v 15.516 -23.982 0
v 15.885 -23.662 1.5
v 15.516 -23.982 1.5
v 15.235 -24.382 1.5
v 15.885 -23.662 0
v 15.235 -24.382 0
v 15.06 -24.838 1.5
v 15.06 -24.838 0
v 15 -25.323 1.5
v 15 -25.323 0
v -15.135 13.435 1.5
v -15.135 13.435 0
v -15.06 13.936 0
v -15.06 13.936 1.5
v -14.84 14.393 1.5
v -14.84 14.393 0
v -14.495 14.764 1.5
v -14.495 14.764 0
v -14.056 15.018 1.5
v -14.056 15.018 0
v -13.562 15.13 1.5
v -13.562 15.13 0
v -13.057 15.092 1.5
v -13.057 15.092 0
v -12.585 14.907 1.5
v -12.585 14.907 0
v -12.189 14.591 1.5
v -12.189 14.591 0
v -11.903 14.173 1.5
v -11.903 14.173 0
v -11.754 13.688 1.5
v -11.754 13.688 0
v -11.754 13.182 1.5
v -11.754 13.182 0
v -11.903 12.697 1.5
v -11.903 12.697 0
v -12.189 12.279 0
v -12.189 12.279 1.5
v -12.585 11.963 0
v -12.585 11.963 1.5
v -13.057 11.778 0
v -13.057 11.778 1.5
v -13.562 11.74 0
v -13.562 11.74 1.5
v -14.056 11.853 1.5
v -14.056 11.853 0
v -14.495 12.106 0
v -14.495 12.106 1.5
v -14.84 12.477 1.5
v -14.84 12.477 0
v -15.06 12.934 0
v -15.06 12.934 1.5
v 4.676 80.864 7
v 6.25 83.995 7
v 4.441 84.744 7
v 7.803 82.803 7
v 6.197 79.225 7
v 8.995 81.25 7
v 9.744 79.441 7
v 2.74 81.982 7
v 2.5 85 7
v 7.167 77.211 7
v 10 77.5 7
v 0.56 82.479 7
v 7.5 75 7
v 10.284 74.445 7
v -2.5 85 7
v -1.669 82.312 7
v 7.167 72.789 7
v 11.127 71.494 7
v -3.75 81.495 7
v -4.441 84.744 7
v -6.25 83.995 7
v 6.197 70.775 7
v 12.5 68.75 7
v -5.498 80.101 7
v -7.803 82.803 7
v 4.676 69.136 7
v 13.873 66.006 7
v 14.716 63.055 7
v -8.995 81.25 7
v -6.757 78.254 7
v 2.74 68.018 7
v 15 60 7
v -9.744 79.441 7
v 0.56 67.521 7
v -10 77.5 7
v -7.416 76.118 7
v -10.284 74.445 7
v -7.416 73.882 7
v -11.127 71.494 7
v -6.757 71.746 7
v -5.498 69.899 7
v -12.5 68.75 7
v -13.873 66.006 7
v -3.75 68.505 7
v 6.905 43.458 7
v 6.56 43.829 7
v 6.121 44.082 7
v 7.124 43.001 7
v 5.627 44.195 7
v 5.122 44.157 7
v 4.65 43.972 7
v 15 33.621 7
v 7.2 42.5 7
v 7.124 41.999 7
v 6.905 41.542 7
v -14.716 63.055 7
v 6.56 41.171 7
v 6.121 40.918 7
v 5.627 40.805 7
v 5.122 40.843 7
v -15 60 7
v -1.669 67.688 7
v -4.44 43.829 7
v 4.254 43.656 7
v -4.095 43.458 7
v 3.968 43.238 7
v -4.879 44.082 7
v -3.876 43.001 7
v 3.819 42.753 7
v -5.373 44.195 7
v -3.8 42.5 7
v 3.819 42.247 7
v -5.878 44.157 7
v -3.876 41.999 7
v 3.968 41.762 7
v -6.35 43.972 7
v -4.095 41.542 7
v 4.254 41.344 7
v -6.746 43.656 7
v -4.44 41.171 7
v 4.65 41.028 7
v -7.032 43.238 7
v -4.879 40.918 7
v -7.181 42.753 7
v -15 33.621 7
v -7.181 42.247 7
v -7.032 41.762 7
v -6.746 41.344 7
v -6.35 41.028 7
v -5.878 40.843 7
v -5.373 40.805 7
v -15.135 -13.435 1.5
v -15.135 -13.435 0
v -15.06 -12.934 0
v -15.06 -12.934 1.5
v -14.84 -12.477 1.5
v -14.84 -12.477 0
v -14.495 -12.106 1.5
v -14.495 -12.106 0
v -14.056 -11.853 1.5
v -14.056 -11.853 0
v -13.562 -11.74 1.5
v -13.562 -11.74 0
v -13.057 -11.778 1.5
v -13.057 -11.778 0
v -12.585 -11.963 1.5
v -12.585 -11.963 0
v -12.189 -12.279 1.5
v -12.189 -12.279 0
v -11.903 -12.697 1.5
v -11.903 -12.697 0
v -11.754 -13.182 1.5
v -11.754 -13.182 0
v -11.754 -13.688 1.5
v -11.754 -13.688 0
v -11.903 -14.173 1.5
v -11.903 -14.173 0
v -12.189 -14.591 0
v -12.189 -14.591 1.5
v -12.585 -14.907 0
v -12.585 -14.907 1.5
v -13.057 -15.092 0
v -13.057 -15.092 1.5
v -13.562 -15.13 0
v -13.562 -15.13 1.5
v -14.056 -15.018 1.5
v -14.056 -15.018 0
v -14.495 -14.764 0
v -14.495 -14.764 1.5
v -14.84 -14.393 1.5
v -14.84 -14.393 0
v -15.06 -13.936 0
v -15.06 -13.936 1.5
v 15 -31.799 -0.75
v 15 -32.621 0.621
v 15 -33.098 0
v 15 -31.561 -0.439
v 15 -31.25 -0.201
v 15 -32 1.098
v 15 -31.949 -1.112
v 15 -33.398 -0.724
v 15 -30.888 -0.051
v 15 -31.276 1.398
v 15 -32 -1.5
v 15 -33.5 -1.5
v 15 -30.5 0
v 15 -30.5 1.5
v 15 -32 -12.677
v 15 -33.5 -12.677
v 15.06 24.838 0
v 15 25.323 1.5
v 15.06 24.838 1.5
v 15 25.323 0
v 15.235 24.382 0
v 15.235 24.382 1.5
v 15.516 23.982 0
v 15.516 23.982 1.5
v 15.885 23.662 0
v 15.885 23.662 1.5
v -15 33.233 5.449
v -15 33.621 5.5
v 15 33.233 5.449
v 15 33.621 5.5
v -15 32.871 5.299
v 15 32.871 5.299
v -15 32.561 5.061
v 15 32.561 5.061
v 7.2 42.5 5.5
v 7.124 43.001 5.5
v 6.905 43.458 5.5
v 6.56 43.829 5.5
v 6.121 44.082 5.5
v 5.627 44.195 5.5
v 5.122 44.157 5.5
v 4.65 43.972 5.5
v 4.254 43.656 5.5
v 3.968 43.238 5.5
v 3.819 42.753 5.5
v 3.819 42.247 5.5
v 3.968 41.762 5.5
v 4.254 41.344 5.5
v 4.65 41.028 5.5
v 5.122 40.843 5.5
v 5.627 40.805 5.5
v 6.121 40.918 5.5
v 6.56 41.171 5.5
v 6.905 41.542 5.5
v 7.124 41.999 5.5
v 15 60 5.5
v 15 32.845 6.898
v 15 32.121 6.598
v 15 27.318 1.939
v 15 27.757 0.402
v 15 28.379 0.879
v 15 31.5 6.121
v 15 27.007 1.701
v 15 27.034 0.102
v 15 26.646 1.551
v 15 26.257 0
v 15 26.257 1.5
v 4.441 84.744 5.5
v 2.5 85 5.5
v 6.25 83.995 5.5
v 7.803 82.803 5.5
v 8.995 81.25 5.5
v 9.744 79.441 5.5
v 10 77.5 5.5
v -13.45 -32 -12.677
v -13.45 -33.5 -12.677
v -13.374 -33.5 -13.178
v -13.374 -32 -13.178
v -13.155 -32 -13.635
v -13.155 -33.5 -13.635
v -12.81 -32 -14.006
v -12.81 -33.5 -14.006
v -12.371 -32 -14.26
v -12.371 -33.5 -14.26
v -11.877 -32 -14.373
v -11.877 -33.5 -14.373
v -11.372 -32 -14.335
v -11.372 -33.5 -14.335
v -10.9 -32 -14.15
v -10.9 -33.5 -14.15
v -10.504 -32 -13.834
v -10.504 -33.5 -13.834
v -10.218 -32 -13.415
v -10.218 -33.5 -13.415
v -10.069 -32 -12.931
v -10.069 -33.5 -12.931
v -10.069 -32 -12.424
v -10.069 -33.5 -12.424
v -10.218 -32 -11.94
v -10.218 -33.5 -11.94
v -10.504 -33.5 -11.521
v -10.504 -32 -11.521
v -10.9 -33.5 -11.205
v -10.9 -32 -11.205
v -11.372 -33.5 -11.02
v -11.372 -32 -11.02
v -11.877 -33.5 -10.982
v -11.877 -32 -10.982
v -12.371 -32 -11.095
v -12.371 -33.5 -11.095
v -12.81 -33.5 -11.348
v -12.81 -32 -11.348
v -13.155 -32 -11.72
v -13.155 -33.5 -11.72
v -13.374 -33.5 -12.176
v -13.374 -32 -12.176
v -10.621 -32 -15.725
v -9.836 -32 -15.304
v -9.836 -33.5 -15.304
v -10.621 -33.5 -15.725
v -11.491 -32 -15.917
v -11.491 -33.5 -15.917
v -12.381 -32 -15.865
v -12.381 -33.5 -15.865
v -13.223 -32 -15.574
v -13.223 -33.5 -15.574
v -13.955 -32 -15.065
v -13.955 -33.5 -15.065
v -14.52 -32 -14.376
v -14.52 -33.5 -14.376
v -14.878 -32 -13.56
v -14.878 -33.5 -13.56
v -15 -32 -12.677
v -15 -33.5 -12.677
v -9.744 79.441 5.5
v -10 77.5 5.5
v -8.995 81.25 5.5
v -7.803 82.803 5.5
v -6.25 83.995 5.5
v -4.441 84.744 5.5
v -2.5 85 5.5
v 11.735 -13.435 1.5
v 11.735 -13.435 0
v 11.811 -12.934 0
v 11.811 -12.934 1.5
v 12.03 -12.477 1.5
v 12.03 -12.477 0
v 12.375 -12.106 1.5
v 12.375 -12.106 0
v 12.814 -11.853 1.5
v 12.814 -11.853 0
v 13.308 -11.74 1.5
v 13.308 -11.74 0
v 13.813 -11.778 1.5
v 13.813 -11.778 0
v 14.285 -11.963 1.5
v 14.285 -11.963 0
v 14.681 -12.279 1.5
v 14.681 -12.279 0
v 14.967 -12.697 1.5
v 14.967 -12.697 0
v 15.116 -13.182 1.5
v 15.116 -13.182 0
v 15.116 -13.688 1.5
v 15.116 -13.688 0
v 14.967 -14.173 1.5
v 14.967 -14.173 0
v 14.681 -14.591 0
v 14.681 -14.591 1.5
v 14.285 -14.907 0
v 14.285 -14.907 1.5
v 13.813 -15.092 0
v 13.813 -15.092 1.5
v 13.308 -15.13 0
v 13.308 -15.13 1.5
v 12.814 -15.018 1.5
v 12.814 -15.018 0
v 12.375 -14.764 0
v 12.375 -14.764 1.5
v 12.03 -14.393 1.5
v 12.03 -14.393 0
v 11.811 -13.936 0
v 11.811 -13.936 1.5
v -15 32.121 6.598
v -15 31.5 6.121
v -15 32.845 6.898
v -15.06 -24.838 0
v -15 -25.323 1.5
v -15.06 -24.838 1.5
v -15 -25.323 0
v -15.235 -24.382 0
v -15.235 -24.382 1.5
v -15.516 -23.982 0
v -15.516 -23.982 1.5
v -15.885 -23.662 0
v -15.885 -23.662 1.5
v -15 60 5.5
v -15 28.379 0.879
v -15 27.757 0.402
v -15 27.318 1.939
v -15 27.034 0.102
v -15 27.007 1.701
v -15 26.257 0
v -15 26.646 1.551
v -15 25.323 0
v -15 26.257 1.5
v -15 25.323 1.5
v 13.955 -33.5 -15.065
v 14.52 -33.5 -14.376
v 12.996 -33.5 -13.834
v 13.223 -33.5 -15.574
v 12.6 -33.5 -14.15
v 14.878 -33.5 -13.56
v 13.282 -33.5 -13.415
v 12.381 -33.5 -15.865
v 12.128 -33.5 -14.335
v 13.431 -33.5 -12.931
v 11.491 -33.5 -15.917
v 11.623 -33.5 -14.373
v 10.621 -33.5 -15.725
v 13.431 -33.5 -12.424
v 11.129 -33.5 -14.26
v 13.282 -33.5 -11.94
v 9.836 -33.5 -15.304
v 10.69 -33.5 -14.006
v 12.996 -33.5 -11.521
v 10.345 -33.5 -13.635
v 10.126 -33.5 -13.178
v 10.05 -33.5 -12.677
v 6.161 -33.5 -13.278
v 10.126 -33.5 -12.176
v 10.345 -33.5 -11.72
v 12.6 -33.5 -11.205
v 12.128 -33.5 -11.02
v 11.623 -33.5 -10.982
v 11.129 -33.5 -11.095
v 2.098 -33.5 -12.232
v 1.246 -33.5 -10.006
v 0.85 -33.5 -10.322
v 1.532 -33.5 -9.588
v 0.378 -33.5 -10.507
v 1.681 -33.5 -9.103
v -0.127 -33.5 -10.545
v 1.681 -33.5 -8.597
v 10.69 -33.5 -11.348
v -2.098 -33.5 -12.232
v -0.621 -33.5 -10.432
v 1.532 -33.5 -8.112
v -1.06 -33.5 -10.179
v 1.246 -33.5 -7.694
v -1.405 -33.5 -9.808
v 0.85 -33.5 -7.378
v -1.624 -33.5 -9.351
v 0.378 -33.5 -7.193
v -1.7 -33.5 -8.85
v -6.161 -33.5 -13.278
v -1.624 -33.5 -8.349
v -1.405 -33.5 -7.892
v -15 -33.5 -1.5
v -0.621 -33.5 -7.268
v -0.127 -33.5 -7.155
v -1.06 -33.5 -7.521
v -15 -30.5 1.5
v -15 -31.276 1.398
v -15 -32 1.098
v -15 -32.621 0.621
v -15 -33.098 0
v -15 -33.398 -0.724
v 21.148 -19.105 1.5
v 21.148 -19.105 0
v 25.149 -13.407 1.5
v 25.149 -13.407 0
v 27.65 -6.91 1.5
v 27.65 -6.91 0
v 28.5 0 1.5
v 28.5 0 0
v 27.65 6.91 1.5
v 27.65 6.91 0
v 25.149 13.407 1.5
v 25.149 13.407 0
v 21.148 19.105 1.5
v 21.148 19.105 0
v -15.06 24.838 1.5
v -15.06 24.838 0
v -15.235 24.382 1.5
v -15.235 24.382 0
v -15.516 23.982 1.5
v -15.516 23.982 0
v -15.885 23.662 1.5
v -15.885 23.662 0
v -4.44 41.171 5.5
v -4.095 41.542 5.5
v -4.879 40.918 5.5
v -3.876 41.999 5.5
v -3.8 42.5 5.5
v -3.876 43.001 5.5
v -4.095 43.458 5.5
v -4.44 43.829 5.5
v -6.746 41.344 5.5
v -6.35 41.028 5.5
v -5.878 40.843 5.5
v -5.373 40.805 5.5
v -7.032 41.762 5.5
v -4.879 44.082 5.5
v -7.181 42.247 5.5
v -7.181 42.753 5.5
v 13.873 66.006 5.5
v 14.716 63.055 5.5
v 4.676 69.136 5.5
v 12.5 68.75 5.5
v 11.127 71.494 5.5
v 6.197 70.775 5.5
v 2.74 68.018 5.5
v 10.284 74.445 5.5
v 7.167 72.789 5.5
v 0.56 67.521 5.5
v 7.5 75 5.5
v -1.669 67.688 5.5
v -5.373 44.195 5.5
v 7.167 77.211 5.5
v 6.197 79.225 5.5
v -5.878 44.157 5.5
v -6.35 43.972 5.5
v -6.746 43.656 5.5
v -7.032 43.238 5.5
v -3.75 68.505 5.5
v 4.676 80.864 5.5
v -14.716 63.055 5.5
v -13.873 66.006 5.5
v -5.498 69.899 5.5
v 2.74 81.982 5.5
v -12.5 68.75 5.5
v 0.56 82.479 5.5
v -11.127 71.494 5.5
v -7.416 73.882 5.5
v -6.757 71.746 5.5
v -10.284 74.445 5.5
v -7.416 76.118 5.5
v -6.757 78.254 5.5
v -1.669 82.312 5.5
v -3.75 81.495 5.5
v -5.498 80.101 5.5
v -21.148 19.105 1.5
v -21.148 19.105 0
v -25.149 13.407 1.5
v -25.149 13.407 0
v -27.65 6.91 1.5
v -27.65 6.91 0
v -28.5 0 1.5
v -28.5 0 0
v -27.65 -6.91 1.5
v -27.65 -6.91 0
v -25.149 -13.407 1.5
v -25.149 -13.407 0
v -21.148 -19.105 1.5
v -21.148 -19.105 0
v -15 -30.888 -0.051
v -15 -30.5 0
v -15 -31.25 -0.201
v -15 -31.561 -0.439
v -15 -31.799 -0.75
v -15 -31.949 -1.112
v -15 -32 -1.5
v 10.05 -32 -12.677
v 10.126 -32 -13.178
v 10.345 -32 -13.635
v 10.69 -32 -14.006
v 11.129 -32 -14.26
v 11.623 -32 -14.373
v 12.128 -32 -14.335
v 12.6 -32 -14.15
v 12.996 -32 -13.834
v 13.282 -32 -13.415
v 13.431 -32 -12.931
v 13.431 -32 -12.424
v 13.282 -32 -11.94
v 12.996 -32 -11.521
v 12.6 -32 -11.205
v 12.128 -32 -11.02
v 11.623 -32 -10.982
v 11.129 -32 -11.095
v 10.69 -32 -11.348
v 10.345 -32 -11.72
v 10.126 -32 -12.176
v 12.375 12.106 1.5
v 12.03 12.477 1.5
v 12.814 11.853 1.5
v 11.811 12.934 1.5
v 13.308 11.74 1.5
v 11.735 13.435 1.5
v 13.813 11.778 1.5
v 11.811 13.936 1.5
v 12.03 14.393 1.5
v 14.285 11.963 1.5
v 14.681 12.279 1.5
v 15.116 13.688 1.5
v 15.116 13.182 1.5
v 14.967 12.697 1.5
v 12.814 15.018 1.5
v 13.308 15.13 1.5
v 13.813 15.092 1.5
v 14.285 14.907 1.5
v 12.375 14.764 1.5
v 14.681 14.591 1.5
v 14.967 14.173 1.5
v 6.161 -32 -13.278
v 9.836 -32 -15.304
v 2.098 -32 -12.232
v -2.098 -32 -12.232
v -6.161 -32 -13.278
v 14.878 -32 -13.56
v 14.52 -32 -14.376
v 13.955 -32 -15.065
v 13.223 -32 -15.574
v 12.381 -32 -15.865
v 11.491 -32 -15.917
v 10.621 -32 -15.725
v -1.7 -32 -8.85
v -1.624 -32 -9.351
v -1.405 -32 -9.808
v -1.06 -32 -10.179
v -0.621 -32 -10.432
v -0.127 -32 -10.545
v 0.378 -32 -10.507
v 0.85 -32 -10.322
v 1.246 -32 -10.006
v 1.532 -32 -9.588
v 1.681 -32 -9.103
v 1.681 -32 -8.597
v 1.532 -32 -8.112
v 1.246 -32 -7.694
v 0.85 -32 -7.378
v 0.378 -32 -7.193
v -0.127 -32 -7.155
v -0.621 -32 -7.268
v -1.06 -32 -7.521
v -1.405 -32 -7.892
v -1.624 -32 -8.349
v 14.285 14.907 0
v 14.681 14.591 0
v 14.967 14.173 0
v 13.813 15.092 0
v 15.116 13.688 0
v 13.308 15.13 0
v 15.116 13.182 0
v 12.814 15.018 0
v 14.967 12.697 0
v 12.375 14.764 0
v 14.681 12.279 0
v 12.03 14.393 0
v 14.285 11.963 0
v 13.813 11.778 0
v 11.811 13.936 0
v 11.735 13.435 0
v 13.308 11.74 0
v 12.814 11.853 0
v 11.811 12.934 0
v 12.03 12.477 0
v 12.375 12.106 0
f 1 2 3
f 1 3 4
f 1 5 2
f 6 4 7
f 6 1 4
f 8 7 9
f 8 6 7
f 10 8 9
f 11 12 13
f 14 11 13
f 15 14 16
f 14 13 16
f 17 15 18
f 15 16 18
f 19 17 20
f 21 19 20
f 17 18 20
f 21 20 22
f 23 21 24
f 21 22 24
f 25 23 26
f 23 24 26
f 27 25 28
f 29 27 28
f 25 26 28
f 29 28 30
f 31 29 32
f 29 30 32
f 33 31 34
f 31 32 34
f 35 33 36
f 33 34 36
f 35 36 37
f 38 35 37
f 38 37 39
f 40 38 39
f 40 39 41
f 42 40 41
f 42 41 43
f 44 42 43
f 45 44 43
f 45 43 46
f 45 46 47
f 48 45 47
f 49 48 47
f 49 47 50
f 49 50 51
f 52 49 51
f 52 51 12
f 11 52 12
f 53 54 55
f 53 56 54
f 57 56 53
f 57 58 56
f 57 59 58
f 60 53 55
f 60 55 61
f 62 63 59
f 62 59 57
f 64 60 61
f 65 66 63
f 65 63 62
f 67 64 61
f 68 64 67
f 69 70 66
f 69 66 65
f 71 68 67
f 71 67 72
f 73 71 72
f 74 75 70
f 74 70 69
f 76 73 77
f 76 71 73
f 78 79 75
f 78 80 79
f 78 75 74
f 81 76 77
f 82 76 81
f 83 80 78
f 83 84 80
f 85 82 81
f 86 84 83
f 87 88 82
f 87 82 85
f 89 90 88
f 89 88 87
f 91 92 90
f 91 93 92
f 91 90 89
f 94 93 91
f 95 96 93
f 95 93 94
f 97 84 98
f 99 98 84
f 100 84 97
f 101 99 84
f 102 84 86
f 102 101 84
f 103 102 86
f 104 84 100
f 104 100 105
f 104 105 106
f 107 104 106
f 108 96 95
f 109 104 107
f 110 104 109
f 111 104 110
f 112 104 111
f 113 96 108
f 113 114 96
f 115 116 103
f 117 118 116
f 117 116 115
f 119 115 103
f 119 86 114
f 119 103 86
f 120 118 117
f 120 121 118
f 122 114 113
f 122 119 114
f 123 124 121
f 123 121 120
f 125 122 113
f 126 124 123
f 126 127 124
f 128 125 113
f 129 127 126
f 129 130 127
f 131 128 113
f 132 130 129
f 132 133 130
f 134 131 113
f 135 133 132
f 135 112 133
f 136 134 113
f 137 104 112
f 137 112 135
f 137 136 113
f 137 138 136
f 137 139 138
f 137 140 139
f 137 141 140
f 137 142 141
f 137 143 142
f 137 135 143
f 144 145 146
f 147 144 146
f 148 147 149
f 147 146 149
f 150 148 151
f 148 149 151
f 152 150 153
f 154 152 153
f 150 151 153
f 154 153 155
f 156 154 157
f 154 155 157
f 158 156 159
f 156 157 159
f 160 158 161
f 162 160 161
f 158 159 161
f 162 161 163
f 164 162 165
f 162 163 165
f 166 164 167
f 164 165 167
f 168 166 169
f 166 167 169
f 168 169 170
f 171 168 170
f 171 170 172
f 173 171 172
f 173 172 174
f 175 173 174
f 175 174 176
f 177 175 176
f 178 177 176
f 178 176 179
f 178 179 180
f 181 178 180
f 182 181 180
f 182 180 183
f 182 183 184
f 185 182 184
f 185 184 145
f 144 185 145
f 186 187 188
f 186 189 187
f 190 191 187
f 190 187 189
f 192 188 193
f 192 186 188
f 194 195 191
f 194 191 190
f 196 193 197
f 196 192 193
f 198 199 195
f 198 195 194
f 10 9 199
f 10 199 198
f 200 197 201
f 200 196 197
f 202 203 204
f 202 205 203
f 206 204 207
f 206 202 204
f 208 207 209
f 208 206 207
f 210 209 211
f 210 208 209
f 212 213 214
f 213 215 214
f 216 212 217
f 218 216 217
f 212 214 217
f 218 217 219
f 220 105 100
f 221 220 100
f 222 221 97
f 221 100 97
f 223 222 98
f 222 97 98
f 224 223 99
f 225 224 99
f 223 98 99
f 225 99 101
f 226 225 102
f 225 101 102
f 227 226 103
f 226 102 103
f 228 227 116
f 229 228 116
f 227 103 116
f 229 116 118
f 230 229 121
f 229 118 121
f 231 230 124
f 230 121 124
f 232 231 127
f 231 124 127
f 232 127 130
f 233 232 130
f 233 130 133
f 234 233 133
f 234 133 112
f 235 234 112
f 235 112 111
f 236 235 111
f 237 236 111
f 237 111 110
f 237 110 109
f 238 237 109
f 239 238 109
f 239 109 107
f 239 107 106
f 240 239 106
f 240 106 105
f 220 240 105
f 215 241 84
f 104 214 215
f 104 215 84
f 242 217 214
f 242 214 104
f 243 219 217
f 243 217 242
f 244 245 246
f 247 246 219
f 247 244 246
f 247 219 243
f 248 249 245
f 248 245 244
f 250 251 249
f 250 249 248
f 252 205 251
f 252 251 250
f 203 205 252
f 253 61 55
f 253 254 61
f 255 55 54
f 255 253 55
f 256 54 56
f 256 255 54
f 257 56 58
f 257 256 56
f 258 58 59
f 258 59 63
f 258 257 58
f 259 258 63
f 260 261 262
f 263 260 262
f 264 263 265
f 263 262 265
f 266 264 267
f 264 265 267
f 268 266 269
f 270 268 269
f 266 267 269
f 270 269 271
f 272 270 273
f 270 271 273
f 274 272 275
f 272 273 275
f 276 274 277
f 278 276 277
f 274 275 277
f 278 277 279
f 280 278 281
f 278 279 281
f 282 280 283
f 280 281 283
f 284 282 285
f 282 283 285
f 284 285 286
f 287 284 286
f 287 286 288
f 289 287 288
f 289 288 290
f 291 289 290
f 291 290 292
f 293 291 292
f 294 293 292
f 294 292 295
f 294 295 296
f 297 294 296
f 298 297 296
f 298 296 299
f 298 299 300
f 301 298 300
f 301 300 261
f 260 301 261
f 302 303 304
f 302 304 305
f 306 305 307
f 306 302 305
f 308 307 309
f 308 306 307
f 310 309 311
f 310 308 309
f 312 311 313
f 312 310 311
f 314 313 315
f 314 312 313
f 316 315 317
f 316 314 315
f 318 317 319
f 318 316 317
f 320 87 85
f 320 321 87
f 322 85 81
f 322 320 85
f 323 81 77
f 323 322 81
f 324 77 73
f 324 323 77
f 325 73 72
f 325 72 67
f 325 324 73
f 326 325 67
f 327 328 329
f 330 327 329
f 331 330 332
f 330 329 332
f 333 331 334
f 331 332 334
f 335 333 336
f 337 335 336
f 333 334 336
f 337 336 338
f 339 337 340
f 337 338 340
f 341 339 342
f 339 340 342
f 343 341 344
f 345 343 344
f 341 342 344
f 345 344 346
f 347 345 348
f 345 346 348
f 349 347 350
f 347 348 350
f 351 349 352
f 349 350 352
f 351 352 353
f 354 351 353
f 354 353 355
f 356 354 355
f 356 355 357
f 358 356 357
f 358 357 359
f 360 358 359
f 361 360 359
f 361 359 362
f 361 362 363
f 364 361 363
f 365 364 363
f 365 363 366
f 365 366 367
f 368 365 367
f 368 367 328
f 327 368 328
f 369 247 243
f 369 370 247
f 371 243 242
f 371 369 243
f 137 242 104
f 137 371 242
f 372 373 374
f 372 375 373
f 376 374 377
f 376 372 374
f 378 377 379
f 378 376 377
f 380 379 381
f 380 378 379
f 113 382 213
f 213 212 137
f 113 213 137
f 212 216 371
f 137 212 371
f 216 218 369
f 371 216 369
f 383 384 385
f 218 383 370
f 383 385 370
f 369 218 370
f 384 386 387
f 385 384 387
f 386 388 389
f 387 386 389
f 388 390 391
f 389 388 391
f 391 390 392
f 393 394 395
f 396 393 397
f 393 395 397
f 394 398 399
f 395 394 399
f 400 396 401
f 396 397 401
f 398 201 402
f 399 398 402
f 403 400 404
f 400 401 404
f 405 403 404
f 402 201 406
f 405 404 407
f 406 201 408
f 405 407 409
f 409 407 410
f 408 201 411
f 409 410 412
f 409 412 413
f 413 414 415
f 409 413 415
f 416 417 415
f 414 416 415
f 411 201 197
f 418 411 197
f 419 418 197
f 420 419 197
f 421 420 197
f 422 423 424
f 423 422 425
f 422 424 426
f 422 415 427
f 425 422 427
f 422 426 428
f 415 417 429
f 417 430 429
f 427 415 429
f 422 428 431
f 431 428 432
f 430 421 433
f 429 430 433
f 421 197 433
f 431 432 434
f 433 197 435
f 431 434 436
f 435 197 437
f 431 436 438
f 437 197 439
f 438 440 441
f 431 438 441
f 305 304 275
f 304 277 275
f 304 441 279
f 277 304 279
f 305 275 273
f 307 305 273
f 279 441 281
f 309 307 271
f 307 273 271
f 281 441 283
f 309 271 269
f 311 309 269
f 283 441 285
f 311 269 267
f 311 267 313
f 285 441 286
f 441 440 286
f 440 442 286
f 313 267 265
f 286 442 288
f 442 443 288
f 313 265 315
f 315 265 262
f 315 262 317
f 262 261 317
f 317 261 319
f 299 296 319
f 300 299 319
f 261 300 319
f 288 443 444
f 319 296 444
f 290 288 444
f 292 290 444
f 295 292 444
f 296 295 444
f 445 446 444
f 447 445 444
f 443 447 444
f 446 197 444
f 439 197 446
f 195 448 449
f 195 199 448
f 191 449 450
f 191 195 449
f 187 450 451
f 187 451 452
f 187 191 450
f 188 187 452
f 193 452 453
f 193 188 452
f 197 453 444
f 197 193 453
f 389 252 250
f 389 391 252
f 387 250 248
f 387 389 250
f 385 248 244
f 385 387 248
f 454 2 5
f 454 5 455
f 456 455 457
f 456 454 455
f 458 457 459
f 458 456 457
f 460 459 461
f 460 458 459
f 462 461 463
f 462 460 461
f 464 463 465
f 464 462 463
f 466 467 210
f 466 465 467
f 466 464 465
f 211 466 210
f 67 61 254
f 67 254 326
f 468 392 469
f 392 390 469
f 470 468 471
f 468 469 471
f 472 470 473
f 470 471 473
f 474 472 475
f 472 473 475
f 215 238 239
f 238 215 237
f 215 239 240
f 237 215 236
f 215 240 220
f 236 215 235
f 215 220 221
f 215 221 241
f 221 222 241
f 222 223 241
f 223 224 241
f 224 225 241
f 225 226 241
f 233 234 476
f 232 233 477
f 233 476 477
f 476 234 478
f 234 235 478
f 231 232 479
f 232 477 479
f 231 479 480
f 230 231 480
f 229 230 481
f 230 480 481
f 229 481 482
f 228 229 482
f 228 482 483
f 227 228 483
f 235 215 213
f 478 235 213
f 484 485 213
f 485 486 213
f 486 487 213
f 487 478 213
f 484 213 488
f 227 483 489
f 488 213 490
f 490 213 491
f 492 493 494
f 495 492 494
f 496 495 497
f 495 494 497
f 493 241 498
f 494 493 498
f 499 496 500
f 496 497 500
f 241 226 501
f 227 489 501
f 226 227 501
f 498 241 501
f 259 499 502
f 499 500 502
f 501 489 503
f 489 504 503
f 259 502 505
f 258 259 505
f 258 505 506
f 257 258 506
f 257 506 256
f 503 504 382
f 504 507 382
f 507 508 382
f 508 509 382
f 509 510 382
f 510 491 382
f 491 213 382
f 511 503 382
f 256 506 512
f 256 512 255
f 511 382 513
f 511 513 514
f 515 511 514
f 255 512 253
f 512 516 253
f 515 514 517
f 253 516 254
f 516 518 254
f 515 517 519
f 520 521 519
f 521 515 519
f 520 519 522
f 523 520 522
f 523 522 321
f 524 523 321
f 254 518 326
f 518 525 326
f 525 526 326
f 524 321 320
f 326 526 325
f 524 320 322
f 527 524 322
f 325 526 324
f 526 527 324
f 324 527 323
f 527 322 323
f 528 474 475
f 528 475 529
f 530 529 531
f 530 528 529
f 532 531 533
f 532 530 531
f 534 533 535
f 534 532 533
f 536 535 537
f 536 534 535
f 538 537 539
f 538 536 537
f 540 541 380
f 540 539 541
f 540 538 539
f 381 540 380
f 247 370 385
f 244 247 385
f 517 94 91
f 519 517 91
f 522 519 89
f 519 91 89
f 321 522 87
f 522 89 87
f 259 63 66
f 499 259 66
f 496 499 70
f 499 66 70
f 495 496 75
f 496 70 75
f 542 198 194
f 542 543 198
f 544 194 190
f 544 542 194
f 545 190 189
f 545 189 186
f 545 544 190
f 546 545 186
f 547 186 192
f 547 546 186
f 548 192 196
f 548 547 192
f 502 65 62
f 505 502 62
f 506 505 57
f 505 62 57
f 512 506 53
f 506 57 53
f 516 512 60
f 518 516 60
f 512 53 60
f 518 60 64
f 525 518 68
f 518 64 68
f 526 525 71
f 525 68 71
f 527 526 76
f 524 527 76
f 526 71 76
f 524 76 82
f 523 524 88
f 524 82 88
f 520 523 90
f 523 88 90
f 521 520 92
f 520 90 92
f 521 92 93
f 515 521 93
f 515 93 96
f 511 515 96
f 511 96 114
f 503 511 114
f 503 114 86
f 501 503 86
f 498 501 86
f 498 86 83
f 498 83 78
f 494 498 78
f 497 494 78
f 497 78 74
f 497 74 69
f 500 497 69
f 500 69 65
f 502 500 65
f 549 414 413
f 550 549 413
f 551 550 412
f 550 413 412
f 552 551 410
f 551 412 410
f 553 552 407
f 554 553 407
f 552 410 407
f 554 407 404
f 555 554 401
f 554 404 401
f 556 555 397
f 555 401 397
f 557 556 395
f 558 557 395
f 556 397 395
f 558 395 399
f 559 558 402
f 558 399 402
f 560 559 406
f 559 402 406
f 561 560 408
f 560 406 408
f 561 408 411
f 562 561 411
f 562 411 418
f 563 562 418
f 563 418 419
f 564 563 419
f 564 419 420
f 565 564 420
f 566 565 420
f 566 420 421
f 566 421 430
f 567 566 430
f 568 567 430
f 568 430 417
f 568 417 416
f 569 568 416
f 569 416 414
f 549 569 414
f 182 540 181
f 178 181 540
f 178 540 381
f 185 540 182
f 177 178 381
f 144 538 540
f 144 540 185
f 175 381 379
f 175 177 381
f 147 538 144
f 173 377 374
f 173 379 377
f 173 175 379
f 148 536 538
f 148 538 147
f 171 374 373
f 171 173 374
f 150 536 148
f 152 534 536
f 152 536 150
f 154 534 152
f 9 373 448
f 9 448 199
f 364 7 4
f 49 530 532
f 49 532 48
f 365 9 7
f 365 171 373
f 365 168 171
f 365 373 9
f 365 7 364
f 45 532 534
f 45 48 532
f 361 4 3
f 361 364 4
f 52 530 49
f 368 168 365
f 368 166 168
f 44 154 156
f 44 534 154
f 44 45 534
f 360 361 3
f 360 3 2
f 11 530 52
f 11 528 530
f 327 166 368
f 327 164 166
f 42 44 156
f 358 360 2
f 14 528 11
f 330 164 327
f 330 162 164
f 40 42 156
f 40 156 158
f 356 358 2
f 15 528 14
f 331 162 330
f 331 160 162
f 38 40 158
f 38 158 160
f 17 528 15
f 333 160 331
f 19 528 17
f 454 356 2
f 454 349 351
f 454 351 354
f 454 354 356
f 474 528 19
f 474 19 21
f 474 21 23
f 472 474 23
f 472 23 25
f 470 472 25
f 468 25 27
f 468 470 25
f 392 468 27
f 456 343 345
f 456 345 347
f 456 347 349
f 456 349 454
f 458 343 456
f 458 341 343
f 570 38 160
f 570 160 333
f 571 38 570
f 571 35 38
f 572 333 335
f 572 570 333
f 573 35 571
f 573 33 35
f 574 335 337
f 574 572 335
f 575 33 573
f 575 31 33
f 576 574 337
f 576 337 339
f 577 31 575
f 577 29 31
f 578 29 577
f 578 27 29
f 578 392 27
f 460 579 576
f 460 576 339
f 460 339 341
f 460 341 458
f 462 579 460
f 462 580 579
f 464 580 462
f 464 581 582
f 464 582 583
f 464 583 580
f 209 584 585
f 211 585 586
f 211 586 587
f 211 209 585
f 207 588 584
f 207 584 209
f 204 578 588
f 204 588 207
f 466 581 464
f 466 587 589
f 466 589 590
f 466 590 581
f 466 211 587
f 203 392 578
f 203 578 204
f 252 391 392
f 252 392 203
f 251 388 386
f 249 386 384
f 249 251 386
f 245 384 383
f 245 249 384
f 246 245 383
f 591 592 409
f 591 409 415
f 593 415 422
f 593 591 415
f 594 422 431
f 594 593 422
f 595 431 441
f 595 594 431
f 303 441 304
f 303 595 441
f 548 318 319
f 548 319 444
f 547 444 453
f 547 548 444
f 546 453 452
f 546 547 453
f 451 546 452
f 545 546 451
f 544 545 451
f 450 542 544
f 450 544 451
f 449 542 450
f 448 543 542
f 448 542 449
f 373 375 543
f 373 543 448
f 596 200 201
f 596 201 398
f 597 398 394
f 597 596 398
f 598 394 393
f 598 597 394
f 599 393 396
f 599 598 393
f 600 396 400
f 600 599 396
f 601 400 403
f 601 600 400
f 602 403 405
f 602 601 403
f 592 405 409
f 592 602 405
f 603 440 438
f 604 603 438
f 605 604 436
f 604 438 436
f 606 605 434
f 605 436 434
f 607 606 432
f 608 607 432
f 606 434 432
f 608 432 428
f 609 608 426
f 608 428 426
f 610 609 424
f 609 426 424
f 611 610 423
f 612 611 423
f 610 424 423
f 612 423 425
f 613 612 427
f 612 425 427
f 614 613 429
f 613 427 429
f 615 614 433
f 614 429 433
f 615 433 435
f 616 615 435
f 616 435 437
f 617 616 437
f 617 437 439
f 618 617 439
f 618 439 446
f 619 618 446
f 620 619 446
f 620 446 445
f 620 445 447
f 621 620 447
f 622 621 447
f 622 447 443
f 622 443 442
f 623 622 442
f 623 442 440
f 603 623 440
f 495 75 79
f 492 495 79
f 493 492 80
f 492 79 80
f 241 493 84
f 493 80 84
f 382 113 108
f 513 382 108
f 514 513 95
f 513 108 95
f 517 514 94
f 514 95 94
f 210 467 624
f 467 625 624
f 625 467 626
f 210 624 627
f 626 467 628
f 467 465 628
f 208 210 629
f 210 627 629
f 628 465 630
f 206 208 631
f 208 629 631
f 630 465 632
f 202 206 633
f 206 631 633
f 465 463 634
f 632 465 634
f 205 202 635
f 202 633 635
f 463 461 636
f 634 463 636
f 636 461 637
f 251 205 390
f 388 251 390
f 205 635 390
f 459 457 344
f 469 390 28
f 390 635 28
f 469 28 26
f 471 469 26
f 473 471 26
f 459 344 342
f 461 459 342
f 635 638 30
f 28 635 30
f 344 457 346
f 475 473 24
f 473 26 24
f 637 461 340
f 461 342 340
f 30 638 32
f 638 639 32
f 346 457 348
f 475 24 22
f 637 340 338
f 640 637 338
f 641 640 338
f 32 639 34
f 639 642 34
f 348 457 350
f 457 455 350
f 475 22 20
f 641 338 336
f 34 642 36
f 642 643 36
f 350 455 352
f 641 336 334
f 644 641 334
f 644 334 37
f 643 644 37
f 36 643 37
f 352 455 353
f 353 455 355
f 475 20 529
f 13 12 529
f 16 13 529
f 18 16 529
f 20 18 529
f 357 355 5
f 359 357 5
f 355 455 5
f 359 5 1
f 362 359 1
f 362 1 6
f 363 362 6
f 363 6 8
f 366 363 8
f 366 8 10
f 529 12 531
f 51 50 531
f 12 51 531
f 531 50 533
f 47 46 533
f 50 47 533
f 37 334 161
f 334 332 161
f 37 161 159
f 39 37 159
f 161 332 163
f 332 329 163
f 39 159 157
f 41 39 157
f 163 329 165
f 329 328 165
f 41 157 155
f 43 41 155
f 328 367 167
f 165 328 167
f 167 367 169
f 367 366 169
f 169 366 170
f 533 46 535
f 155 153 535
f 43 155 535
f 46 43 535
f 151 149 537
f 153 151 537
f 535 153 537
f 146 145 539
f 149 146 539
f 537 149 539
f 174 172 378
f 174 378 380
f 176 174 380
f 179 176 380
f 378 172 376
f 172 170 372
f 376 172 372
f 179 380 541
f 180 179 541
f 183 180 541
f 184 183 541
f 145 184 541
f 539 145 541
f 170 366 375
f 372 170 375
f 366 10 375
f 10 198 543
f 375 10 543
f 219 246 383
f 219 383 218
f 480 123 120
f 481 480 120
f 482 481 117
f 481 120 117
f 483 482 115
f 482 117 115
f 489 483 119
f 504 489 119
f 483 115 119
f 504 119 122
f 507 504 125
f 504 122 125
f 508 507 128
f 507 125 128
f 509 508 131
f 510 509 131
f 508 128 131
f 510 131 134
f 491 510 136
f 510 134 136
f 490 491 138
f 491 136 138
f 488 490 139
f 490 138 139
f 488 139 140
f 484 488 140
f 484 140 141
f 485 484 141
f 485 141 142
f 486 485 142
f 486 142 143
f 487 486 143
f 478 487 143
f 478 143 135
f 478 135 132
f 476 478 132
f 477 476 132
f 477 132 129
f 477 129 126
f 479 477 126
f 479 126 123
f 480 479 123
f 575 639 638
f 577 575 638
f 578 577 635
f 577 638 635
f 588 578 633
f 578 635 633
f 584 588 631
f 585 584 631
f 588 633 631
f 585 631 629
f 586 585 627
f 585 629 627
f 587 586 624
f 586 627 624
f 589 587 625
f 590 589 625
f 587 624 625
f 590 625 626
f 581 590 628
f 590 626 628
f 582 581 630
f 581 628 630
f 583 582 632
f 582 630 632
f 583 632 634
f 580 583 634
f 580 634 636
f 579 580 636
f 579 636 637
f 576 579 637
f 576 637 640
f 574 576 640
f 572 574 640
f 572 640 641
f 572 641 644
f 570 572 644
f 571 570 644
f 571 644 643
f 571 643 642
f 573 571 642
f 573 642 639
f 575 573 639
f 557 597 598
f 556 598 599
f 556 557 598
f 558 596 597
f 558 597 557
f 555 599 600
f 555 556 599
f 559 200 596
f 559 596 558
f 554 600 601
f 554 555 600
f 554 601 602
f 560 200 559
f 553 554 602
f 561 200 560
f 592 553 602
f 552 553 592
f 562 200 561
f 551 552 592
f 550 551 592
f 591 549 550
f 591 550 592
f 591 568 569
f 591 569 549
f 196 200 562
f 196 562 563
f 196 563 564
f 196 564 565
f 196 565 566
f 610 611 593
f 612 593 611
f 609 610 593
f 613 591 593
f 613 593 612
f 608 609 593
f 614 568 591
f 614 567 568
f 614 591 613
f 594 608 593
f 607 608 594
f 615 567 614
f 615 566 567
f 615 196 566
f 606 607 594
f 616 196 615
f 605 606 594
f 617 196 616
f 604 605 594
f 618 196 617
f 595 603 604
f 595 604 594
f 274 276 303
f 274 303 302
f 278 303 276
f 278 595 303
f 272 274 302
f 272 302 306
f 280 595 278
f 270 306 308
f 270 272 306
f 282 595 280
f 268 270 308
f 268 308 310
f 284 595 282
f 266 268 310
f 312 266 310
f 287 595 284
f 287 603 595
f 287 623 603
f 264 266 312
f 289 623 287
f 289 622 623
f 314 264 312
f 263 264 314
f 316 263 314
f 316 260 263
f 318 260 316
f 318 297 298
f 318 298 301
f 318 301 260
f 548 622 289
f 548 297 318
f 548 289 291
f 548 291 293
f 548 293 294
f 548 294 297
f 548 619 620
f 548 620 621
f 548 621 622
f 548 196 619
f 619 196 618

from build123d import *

# Parameters (mm, degrees)
EXTRUDE_1_DEPTH             = 30
EXTRUDE_2_DEPTH             = 14.177345132
SKETCH_3_W                  = 30
SKETCH_3_H                  = 14.177345132
EXTRUDE_3_DEPTH             = 7.766758368
EXTRUDE_4_DEPTH             = 1.5
CUT_EXTRUDE_START           = -0.577345132
CUT_EXTRUDE_1_DEPTH         = 0.577345132
CUT_EXTRUDE_START_2         = -12.1
CUT_EXTRUDE_2_DEPTH         = 12.1
SKETCH_7_W                  = 30
SKETCH_7_H                  = 7
EXTRUDE_5_DEPTH             = 52.621320344
CUT_EXTRUDE_3_DEPTH         = 97.803565652
CUT_EXTRUDE_4_DEPTH         = 93.536010044
CUT_EXTRUDE_5_DEPTH         = 93.536010044
HOLE_WIZARD_3_4_3_4_1_D     = 3.4
HOLE_WIZARD_3_4_3_4_2_D     = 3.4
HOLE_WIZARD_15_0_15_1_D     = 15
HOLE_WIZARD_3_4_3_4_3_D     = 3.4
HOLE_WIZARD_3_4_3_4_3_DEPTH = 17.427345132
FILLET_1_R                  = 1.5
FILLET_2_R                  = 2
FILLET_3_R                  = 3
FILLET_4_R                  = 7.5


with BuildPart() as part:
    # 草图1 → 凸台-拉伸1 (new body)
    with BuildSketch(Plane(origin=(15, 0, 0), x_dir=(0, 0, -1), z_dir=(1, 0, 0))):
        Polygon((-7, 32.378679656), (-1.5, 26.878679656), (-1.5, 32.378679656), align=None)
    extrude(amount=-EXTRUDE_1_DEPTH)

    # 草图2 → 凸台-拉伸2 (add)
    with BuildSketch(Plane(origin=(0, 0, 1.5), x_dir=(-1, 0, 0), z_dir=(0, 0, -1))):
        with BuildLine():
            Line((-15, 24.233241632), (-15, 32.378679656))
            Line((-15, 32.378679656), (15, 32.378679656))
            Line((15, 32.378679656), (15, 24.233241632))
            ThreePointArc((15, 24.233241632), (28.5, 0), (15, -24.233241632))
            Line((15, -24.233241632), (-15, -24.233241632))
            ThreePointArc((-15, -24.233241632), (-28.5, 0), (-15, 24.233241632))
        make_face()
    extrude(amount=EXTRUDE_2_DEPTH)

    # 草图3 → 凸台-拉伸3 (add)
    with BuildSketch(Plane.XZ.offset(24.233241632)):
        with Locations((0, -5.588672566)):
            Rectangle(SKETCH_3_W, SKETCH_3_H)
    extrude(amount=EXTRUDE_3_DEPTH)

    # 草图4 → 凸台-拉伸4 (add)
    with BuildSketch(Plane.XZ.offset(32)):
        with BuildLine():
            Line((15, 1.5), (15, -12.677345132))
            ThreePointArc((15, -12.677345132), (13.223342916, -15.57419871), (9.835839599, -15.303842792))
            ThreePointArc((9.835839599, -15.303842792), (0, -12.1), (-9.835839599, -15.303842792))
            ThreePointArc((-9.835839599, -15.303842792), (-13.223342916, -15.57419871), (-15, -12.677345132))
            Line((-15, -12.677345132), (-15, 1.5))
            Line((-15, 1.5), (15, 1.5))
        make_face()
    extrude(amount=EXTRUDE_4_DEPTH)

    # 草图5 → 切除-拉伸1 (cut)
    with BuildSketch(Plane(origin=(0, 0, -12.677345132), x_dir=(-1, 0, 0), z_dir=(0, 0, -1)).offset(CUT_EXTRUDE_START)):
        with BuildLine():
            Line((15, 24.233241632), (15, 32.378679656))
            Line((15, 32.378679656), (-15, 32.378679656))
            Line((-15, 32.378679656), (-15, 24.233241632))
            ThreePointArc((-15, 24.233241632), (-28.5, 0), (-15, -24.233241632))
            Line((-15, -24.233241632), (-15, -32))
            Line((-15, -32), (0, -32))
            Line((0, -32), (15, -32))
            Line((15, -32), (15, -24.233241632))
            ThreePointArc((15, -24.233241632), (28.5, 0), (15, 24.233241632))
        make_face()
    extrude(amount=CUT_EXTRUDE_1_DEPTH, mode=Mode.SUBTRACT)

    # 草图6 → 切除-拉伸2 (cut)
    with BuildSketch(Plane(origin=(0, 0, -12.1), x_dir=(-1, 0, 0), z_dir=(0, 0, -1)).offset(CUT_EXTRUDE_START_2)):
        with BuildLine():
            Line((15, 24.233241632), (15, 32.378679656))
            Line((15, 32.378679656), (-15, 32.378679656))
            Line((-15, 32.378679656), (-15, 24.233241632))
            ThreePointArc((-15, 24.233241632), (-28.5, 0), (-15, -24.233241632))
            Line((-15, -24.233241632), (-15, -32))
            Line((-15, -32), (15, -32))
            Line((15, -32), (15, -24.233241632))
            ThreePointArc((15, -24.233241632), (28.5, 0), (15, 24.233241632))
        make_face()
    extrude(amount=CUT_EXTRUDE_2_DEPTH, mode=Mode.SUBTRACT)

    # 草图7 → 凸台-拉伸5 (add)
    with BuildSketch(Plane(origin=(0, 32.378679656, 0), x_dir=(-1, 0, 0), z_dir=(0, 1, 0))):
        with Locations((0, 3.5)):
            Rectangle(SKETCH_7_W, SKETCH_7_H)
    extrude(amount=EXTRUDE_5_DEPTH)

    # 草图8 → 切除-拉伸3 (cut, through all)
    with BuildSketch(Plane.ZY.offset(15)):
        Polygon((0, 27.5), (5.5, 33), (5.5, 85), (0, 85), align=None)
    extrude(amount=-CUT_EXTRUDE_3_DEPTH, mode=Mode.SUBTRACT)

    # 草图9 → 切除-拉伸4 (cut, through all)
    with BuildSketch(Plane.XY.offset(7)):
        with BuildLine():
            Line((-11.795428312, 85), (-15, 85))
            Line((-15, 85), (-15, 60))
            ThreePointArc((-15, 60), (-14.362740383, 64.550068681), (-12.5, 68.75))
            ThreePointArc((-12.5, 68.75), (-10.015546325, 76.782552918), (-11.795428312, 85))
        make_face()
    extrude(amount=-CUT_EXTRUDE_4_DEPTH, mode=Mode.SUBTRACT)

    # 草图10 → 切除-拉伸5 (cut, through all)
    with BuildSketch(Plane.XY.offset(7)):
        with BuildLine():
            Line((15, 60), (15, 85))
            Line((15, 85), (11.795428312, 85))
            ThreePointArc((11.795428312, 85), (10.015546325, 76.782552918), (12.5, 68.75))
            ThreePointArc((12.5, 68.75), (14.362740383, 64.550068681), (15, 60))
        make_face()
    extrude(amount=-CUT_EXTRUDE_5_DEPTH, mode=Mode.SUBTRACT)

    # Ø3.4 (3.4) 直径孔1 (through all)
    with Locations(Plane(origin=(0, 0, 5.5), x_dir=(-1, 0, 0), z_dir=(0, 0, -1))):
        with Locations((5.5, 42.5), (-5.5, 42.5)):
            Hole(HOLE_WIZARD_3_4_3_4_1_D / 2)

    # Ø3.4 (3.4) 直径孔2 (through all)
    with Locations(Plane(origin=(0, -32, 0), x_dir=(1, 0, 0), z_dir=(0, 1, 0))):
        with Locations((-11.75, 12.677345132), (0, 8.85), (11.75, 12.677345132)):
            Hole(HOLE_WIZARD_3_4_3_4_2_D / 2)

    # Ø15.0 (15) 直径孔1 (through all)
    with Locations(Plane(origin=(0, 0, 5.5), x_dir=(-1, 0, 0), z_dir=(0, 0, -1))):
        with Locations((0, 75)):
            Hole(HOLE_WIZARD_15_0_15_1_D / 2)

    # Ø3.4 (3.4) 直径孔3
    with Locations(Plane.XY.offset(1.5)):
        with Locations((-13.435028843, -13.435028843), (-13.435028843, 13.435028843), (13.435028843, -13.435028843), (13.435028843, 13.435028843)):
            Hole(HOLE_WIZARD_3_4_3_4_3_D / 2, depth=HOLE_WIZARD_3_4_3_4_3_DEPTH)

    # 圆角1
    fillet_1_edges = [part.edges().sort_by_distance(p)[0] for p in [
        (0, -32, 0),
        (0, 33, 5.5),
        (0, 26.878679656, 1.5),
    ]]
    fillet(fillet_1_edges, radius=FILLET_1_R)

    # 圆角2
    fillet_2_edges = [part.edges().sort_by_distance(p)[0] for p in [
        (-15, -24.233241632, 0.75),
        (15, -24.233241632, 0.75),
        (-15, 24.233241632, 0.75),
        (15, 24.233241632, 0.75),
    ]]
    fillet(fillet_2_edges, radius=FILLET_2_R)

    # 圆角3
    fillet_3_edges = [part.edges().sort_by_distance(p)[0] for p in [
        (0, 27.5, 0),
        (0, -33.5, 1.5),
        (0, 32.378679656, 7),
    ]]
    fillet(fillet_3_edges, radius=FILLET_3_R)

    # 圆角4
    fillet_4_edges = [part.edges().sort_by_distance(p)[0] for p in [
        (-11.795428312, 85, 6.25),
        (11.795428312, 85, 6.25),
    ]]
    fillet(fillet_4_edges, radius=FILLET_4_R)


solid = part.part
